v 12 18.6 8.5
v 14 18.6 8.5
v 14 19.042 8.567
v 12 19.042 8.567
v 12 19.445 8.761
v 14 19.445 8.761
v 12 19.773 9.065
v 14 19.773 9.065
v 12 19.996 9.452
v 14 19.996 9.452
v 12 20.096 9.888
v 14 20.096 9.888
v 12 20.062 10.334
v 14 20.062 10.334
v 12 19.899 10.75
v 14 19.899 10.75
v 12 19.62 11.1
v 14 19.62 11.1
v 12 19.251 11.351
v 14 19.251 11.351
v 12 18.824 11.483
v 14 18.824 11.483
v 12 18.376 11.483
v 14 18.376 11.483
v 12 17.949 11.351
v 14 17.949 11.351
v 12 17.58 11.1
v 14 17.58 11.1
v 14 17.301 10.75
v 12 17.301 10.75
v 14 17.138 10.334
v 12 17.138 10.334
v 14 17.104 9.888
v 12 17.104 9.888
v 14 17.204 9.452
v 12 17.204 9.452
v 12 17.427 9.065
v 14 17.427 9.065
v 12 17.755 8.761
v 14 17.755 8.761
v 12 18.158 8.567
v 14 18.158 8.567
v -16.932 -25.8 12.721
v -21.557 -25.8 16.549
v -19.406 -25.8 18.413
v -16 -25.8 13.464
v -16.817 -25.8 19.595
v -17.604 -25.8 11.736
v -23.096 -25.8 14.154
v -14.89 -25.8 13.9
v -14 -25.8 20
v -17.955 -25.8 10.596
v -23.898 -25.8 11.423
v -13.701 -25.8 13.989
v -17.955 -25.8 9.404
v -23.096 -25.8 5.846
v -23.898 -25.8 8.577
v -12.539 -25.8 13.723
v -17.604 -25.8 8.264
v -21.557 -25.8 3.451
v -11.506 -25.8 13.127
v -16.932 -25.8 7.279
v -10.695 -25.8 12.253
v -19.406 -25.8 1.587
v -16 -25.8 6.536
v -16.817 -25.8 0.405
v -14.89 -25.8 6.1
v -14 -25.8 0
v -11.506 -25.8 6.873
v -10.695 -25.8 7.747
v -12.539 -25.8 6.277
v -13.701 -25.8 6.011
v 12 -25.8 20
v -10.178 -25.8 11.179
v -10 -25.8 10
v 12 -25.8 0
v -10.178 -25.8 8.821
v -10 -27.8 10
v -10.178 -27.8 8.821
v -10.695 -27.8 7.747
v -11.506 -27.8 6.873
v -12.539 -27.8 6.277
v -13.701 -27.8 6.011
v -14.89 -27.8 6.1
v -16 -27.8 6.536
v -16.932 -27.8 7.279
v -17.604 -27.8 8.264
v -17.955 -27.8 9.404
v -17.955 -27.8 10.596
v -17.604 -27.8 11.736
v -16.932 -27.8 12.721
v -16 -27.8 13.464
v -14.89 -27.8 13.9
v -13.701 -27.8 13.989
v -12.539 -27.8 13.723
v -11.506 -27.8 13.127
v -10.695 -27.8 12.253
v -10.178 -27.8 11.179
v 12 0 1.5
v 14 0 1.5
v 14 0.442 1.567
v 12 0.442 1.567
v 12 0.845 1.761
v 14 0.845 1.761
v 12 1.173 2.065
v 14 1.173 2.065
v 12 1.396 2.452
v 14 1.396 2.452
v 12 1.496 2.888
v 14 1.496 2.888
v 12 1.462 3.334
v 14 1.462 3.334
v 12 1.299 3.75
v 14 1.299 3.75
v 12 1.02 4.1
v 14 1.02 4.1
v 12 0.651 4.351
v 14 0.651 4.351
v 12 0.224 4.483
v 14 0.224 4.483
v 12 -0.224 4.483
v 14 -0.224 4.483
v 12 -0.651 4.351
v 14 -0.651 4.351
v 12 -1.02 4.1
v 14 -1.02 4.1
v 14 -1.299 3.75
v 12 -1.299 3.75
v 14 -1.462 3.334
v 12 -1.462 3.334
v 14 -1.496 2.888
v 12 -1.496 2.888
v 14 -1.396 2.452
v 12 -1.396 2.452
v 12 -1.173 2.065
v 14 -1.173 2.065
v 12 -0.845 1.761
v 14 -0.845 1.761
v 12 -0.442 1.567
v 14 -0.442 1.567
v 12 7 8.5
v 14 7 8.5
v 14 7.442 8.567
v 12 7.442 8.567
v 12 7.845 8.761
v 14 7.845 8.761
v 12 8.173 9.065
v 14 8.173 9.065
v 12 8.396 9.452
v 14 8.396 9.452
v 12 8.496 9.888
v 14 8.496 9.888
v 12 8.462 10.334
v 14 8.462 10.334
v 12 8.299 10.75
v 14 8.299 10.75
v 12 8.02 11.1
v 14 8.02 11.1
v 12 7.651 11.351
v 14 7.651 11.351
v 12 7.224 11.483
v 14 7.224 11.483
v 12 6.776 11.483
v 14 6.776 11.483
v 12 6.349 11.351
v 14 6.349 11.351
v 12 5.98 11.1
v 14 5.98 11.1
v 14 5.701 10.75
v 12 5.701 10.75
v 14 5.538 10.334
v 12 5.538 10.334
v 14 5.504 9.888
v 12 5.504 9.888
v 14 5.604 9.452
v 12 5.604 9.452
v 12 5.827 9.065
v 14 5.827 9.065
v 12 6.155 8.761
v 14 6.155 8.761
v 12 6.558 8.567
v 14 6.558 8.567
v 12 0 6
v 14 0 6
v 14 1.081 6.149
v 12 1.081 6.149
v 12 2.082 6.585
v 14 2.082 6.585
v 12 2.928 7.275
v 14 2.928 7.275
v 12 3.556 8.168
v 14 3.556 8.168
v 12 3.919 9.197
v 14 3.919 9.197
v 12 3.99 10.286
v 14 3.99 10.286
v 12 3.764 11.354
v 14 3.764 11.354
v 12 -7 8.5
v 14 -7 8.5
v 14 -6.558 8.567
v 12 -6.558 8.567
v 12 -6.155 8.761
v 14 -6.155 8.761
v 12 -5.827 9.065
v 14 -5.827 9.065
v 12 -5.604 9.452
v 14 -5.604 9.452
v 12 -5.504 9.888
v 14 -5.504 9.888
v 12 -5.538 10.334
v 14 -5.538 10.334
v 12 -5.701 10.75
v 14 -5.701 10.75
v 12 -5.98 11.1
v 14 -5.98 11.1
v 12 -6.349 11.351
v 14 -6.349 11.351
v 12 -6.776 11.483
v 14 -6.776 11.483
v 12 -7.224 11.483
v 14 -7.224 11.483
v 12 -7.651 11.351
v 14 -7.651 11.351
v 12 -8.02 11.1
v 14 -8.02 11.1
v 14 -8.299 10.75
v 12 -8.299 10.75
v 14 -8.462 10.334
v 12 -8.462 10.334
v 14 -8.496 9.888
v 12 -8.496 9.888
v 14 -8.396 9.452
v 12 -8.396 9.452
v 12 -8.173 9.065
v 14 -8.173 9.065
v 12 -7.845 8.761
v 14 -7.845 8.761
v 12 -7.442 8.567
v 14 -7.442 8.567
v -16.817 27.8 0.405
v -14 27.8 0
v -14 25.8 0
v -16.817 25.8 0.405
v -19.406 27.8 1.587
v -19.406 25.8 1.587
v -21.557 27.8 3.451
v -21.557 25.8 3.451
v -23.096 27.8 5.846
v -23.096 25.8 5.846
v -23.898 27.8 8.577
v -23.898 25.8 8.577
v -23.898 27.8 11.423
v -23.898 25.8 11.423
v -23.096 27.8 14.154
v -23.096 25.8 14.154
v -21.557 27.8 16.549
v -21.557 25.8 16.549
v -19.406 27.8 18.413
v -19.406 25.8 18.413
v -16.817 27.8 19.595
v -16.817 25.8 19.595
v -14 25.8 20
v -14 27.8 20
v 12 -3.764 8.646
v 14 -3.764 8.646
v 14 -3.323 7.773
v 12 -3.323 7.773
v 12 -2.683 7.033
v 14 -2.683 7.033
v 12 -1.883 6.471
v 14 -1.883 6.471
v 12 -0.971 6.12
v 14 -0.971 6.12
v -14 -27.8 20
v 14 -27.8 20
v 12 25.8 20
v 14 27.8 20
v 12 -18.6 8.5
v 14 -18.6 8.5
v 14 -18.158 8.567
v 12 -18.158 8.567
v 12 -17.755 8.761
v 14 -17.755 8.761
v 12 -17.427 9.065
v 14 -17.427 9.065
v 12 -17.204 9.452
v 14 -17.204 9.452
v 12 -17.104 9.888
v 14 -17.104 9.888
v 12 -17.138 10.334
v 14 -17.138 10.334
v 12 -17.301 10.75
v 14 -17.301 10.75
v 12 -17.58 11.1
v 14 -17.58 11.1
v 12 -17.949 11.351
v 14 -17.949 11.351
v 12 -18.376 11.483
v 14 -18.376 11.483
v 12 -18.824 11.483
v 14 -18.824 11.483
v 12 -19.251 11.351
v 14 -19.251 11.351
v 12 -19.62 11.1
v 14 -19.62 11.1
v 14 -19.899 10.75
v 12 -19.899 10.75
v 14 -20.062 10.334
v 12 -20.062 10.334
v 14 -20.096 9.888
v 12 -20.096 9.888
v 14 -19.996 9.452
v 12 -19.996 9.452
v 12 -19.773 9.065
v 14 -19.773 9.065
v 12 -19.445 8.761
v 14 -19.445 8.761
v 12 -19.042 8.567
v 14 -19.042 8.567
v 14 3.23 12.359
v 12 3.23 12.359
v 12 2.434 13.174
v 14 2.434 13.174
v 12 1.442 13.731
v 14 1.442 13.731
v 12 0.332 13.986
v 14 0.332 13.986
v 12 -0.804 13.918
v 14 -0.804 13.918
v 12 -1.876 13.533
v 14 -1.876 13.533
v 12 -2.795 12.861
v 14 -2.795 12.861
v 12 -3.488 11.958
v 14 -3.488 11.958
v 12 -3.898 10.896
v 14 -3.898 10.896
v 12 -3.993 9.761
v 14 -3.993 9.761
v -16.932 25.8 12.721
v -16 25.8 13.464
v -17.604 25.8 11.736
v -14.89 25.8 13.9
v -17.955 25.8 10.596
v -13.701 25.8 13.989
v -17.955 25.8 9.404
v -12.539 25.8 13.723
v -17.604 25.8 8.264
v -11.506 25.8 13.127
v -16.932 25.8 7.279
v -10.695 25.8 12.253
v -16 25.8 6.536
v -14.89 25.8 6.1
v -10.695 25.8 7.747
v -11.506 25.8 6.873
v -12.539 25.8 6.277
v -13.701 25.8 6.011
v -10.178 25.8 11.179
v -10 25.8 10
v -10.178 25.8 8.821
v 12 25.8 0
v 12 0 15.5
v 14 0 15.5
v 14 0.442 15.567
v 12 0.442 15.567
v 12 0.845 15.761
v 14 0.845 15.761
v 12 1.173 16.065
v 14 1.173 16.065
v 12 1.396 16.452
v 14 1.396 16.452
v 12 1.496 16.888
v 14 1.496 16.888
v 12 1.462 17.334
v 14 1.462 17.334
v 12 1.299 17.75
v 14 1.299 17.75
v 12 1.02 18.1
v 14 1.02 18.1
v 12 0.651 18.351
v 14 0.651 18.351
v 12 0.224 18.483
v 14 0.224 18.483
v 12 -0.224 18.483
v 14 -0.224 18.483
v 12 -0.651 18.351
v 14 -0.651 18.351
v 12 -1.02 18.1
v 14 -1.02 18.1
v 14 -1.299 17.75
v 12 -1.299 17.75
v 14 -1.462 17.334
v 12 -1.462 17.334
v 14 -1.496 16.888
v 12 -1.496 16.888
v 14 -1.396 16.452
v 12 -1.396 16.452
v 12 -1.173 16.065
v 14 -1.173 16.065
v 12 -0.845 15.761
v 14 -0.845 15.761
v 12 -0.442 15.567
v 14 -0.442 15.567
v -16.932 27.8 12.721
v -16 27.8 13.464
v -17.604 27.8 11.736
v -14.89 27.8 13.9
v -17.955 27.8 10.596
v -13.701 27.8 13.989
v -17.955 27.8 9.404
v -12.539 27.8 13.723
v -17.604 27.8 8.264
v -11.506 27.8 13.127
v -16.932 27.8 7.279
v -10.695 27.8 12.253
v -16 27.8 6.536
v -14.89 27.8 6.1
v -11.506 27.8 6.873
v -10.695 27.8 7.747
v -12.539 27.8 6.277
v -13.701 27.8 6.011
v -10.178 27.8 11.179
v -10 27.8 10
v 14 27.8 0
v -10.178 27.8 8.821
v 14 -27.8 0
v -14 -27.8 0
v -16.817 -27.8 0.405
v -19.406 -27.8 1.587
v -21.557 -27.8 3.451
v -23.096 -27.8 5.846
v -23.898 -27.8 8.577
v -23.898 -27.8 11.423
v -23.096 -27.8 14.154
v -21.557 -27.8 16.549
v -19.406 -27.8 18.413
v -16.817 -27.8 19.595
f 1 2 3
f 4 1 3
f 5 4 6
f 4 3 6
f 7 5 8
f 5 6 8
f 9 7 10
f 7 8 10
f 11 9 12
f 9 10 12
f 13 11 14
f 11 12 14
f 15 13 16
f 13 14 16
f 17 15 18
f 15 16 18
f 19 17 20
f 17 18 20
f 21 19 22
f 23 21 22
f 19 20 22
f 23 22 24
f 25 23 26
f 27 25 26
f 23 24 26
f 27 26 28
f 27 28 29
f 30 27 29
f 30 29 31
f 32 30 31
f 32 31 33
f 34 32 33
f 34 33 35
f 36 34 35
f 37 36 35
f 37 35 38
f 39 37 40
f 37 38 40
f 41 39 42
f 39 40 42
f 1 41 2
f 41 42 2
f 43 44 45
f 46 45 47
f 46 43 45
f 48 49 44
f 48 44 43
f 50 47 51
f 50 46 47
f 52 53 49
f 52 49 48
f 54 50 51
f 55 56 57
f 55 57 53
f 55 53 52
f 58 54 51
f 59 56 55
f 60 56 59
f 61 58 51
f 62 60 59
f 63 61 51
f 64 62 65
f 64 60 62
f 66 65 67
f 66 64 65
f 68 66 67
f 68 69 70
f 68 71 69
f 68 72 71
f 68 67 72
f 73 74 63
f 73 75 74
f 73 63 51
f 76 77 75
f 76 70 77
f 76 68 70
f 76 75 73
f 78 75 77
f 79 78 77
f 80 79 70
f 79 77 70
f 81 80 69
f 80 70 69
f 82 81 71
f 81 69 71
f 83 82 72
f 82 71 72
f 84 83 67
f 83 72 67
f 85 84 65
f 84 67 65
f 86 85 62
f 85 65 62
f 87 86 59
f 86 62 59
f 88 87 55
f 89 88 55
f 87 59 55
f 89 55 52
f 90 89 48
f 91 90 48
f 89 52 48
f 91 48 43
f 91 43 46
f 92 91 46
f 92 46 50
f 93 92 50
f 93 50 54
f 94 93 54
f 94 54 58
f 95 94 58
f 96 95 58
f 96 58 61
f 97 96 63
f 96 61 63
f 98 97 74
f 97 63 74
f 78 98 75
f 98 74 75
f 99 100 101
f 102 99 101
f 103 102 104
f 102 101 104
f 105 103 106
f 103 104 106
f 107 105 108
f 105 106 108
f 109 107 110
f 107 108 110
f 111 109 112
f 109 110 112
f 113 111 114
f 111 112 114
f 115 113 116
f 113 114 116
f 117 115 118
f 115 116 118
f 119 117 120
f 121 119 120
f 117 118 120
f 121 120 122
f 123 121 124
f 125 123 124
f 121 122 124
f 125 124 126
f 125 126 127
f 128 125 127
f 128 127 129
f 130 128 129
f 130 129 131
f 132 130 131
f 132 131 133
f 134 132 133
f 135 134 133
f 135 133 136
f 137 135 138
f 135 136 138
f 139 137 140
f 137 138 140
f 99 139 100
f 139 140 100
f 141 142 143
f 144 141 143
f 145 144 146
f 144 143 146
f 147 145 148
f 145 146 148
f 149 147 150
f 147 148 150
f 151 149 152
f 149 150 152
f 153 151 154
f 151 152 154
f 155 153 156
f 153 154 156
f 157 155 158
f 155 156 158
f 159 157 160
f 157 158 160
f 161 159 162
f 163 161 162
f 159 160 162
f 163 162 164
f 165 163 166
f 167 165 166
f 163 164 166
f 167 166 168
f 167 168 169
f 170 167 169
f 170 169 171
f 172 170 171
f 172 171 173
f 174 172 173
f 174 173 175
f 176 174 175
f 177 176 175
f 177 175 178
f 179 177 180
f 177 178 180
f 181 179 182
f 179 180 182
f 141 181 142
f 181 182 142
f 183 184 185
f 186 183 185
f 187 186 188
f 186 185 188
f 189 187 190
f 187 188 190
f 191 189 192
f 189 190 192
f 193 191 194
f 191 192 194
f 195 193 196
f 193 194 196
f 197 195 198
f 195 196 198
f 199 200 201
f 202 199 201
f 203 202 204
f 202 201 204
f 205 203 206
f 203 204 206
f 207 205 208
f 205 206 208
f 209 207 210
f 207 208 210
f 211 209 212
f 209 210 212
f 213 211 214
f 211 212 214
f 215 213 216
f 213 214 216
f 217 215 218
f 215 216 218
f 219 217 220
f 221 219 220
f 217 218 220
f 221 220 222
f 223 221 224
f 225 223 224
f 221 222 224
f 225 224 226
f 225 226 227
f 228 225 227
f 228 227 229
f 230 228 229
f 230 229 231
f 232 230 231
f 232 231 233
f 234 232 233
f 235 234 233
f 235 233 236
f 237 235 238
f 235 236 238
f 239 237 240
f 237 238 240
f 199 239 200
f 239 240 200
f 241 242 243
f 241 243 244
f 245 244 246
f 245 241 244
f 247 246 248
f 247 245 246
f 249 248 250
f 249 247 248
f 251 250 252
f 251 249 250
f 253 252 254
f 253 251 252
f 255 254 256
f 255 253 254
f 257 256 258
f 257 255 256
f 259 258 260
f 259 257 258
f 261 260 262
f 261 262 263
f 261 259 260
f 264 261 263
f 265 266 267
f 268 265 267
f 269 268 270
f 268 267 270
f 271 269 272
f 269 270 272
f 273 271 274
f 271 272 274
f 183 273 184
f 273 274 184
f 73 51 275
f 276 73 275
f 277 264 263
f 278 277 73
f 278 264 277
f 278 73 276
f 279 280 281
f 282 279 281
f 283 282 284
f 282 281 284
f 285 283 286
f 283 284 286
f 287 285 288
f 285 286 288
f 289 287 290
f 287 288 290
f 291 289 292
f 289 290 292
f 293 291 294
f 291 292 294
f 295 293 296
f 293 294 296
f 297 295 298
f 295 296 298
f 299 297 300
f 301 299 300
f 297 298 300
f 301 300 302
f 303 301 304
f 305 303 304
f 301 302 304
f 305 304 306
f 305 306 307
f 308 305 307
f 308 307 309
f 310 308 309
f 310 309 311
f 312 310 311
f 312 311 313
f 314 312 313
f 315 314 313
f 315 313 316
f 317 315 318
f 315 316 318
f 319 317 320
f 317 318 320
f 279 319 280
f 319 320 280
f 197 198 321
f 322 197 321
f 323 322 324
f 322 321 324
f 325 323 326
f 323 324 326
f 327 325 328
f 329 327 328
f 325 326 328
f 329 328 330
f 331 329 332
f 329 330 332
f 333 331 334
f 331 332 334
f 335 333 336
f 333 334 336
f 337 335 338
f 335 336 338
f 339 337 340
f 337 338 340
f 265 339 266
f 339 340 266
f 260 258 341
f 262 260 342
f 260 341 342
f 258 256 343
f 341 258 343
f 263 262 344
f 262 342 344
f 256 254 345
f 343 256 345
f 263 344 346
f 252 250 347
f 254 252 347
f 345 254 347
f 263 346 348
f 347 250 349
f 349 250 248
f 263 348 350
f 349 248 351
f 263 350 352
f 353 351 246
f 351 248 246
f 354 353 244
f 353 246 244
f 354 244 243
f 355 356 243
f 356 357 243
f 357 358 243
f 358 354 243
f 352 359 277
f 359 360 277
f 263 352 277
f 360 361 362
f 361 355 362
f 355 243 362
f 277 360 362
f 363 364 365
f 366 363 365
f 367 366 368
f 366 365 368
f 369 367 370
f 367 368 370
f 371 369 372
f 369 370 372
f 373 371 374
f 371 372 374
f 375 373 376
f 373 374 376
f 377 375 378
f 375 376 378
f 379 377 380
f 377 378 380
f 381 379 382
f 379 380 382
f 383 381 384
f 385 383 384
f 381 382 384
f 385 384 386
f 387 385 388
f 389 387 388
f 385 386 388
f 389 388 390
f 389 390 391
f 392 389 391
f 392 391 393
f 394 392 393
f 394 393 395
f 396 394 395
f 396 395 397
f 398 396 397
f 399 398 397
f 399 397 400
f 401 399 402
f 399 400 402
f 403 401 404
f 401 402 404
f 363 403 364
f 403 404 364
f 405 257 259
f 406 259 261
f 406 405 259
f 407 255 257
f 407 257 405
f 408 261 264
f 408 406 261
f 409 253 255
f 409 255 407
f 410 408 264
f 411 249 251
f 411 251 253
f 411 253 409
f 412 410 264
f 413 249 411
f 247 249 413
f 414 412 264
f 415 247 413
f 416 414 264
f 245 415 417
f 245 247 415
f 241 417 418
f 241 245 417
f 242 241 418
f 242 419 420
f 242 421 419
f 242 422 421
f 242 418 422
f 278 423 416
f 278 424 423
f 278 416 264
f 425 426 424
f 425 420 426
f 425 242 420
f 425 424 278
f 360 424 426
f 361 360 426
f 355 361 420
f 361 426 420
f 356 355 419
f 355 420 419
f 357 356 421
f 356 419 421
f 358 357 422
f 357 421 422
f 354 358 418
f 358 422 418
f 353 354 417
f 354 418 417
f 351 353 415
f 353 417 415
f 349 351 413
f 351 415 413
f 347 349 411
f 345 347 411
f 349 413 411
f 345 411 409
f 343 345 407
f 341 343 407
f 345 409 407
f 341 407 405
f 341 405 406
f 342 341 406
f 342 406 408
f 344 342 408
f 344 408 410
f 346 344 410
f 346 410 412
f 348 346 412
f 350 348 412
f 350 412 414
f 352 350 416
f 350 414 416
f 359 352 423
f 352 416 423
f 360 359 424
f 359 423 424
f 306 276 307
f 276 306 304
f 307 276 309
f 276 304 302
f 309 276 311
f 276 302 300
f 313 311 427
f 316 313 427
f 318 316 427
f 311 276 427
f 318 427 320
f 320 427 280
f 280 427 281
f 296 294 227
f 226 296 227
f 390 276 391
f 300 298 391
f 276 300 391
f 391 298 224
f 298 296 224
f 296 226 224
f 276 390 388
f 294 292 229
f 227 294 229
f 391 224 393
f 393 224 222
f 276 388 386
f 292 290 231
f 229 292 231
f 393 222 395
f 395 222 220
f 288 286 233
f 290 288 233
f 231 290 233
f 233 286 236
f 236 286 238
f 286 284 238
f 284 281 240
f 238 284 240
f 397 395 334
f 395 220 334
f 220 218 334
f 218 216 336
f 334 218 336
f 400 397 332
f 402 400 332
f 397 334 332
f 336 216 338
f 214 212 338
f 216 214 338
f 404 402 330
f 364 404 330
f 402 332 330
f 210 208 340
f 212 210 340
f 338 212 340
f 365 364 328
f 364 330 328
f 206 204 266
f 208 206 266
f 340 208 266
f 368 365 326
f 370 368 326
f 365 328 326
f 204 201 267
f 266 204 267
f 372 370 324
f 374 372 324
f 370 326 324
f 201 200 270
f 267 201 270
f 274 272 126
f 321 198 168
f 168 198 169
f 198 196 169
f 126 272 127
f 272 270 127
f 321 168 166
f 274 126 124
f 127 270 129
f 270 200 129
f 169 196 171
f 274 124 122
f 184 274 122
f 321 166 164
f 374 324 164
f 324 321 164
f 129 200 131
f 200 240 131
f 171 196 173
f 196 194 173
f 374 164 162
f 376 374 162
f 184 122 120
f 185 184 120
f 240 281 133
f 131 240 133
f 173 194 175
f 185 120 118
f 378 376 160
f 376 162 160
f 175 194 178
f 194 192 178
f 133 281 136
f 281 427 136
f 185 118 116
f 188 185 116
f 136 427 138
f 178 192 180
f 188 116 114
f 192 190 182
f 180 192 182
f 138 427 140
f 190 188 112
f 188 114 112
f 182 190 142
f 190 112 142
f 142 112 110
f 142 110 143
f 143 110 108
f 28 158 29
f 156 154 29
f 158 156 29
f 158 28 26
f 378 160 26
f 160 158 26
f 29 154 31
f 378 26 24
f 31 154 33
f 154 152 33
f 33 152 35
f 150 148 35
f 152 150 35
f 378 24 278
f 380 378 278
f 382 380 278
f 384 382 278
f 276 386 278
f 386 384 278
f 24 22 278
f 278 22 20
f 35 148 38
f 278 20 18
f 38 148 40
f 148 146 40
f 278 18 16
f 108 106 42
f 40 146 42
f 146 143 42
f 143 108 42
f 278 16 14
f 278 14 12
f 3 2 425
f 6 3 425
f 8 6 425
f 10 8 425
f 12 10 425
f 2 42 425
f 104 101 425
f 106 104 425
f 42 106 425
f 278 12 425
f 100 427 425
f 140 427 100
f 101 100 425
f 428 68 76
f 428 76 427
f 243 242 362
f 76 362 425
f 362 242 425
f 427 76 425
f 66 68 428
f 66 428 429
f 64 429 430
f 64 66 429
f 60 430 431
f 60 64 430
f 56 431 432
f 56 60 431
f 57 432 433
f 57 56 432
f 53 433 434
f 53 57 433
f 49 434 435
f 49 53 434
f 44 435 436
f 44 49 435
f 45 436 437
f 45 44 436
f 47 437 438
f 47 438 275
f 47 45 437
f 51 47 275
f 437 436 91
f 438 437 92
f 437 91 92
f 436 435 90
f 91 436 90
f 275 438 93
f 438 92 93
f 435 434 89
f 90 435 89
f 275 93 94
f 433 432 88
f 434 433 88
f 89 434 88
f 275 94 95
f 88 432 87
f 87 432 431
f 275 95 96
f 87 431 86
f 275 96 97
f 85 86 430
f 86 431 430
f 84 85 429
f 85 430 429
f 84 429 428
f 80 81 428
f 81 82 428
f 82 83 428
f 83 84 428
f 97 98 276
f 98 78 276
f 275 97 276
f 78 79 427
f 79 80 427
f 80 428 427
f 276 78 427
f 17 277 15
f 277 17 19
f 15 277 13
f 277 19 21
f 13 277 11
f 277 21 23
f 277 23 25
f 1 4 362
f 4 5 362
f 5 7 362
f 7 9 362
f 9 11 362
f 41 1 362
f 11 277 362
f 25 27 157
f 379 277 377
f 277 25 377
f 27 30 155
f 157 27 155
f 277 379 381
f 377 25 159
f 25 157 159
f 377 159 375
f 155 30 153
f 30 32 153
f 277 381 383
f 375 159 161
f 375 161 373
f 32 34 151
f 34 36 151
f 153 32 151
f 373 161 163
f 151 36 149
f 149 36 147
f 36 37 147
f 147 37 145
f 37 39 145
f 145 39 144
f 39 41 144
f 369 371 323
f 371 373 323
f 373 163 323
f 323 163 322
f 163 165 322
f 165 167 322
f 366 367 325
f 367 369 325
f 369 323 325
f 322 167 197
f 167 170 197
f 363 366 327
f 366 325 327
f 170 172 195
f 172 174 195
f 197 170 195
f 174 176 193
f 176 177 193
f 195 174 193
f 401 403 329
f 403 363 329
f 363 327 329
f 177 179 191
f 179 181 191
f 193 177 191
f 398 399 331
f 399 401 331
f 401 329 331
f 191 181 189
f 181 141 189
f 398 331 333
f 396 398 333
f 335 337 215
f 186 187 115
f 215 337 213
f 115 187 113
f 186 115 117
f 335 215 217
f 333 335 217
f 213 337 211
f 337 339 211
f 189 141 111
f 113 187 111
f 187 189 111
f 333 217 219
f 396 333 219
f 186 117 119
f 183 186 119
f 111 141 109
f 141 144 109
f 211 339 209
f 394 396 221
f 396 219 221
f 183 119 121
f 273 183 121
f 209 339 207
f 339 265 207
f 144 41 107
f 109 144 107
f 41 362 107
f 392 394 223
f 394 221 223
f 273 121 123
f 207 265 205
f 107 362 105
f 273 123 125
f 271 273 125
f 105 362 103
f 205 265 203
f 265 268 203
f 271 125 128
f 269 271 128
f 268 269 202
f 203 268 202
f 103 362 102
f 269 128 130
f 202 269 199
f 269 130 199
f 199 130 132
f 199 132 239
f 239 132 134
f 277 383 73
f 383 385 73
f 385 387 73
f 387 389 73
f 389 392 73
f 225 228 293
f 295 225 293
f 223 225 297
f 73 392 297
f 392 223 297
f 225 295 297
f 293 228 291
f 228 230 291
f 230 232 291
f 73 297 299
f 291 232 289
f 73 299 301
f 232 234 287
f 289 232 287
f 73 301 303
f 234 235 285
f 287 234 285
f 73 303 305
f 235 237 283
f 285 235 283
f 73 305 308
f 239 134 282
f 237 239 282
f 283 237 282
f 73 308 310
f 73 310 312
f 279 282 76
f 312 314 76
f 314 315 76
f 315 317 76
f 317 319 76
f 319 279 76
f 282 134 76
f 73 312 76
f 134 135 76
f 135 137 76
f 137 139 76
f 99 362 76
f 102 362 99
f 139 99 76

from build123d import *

# Parameters (mm, degrees)
SALIENTE_EXTRUIR1_DEPTH = 20
SALIENTE_EXTRUIR2_DEPTH = 2
SALIENTE_EXTRUIR3_DEPTH = 2
CROQUIS4_R              = 4
CORTAR_EXTRUIR1_DEPTH   = 2
CROQUIS5_R              = 4
CORTAR_EXTRUIR2_DEPTH   = 2
CORTAR_EXTRUIR3_DEPTH   = 2
CROQUIS7_R              = 1.5
CORTAR_EXTRUIR4_DEPTH   = 2
CROQUIS8_R              = 1.5
CORTAR_EXTRUIR5_DEPTH   = 2


with BuildPart() as part:
    # Croquis1 → Saliente-Extruir1 (new body)
    with BuildSketch(Plane.XY):
        Polygon((-12, 25.8), (12, 25.8), (12, -25.8), (-12, -25.8), (-14, -25.8), (-14, -27.8), (14, -27.8), (14, 27.8), (-14, 27.8), (-14, 25.8), align=None)
    extrude(amount=SALIENTE_EXTRUIR1_DEPTH)

    # Croquis2 → Saliente-Extruir2 (add)
    with BuildSketch(Plane(origin=(0, 27.8, 0), x_dir=(1, 0, 0), z_dir=(0, 1, 0))):
        with BuildLine():
            Line((-14, -20), (-14, 0))
            ThreePointArc((-14, 0), (-24, -10), (-14, -20))
        make_face()
    extrude(amount=-SALIENTE_EXTRUIR2_DEPTH)

    # Croquis3 → Saliente-Extruir3 (add)
    with BuildSketch(Plane(origin=(0, -25.8, 0), x_dir=(1, 0, 0), z_dir=(0, 1, 0))):
        with BuildLine():
            Line((-14, -20), (-14, 0))
            ThreePointArc((-14, 0), (-24, -10), (-14, -20))
        make_face()
    extrude(amount=-SALIENTE_EXTRUIR3_DEPTH)

    # Croquis4 → Cortar-Extruir1 (cut)
    with BuildSketch(Plane(origin=(0, 27.8, 0), x_dir=(1, 0, 0), z_dir=(0, 1, 0))):
        with Locations((-14, -10)):
            Circle(CROQUIS4_R)
    extrude(amount=-CORTAR_EXTRUIR1_DEPTH, mode=Mode.SUBTRACT)

    # Croquis5 → Cortar-Extruir2 (cut)
    with BuildSketch(Plane(origin=(0, -25.8, 0), x_dir=(1, 0, 0), z_dir=(0, 1, 0))):
        with Locations((-14, -10)):
            Circle(CROQUIS5_R)
    extrude(amount=-CORTAR_EXTRUIR2_DEPTH, mode=Mode.SUBTRACT)

    # Croquis6 → Cortar-Extruir3 (cut)
    with BuildSketch(Plane(origin=(14, 0, 0), x_dir=(0, 0, -1), z_dir=(1, 0, 0))):
        with BuildLine():
            ThreePointArc((-6, 0), (-7.699530032, 3.272283289), (-11.353918963, 3.763894717))
            Line((-11.353918963, 3.763894717), (-8.646081037, -3.763894717))
            ThreePointArc((-8.646081037, -3.763894717), (-6.727716711, -2.300469968), (-6, 0))
        make_face()
        with BuildLine():
            Line((-8.646081037, -3.763894717), (-11.353918963, 3.763894717))
            ThreePointArc((-11.353918963, 3.763894717), (-13.763894717, -1.353918963), (-8.646081037, -3.763894717))
        make_face()
    extrude(amount=-CORTAR_EXTRUIR3_DEPTH, mode=Mode.SUBTRACT)

    # Croquis7 → Cortar-Extruir4 (cut)
    with BuildSketch(Plane(origin=(14, 0, 0), x_dir=(0, 0, -1), z_dir=(1, 0, 0))):
        with Locations((-10, 7)):
            Circle(CROQUIS7_R)
        with Locations((-3, 0)):
            Circle(CROQUIS7_R)
        with Locations((-10, -7)):
            Circle(CROQUIS7_R)
        with Locations((-17, 0)):
            Circle(CROQUIS7_R)
    extrude(amount=-CORTAR_EXTRUIR4_DEPTH, mode=Mode.SUBTRACT)

    # Croquis8 → Cortar-Extruir5 (cut)
    with BuildSketch(Plane(origin=(14, 0, 0), x_dir=(0, 0, -1), z_dir=(1, 0, 0))):
        with Locations((-10, 18.6)):
            Circle(CROQUIS8_R)
        with Locations((-10, -18.6)):
            Circle(CROQUIS8_R)
    extrude(amount=-CORTAR_EXTRUIR5_DEPTH, mode=Mode.SUBTRACT)


solid = part.part
